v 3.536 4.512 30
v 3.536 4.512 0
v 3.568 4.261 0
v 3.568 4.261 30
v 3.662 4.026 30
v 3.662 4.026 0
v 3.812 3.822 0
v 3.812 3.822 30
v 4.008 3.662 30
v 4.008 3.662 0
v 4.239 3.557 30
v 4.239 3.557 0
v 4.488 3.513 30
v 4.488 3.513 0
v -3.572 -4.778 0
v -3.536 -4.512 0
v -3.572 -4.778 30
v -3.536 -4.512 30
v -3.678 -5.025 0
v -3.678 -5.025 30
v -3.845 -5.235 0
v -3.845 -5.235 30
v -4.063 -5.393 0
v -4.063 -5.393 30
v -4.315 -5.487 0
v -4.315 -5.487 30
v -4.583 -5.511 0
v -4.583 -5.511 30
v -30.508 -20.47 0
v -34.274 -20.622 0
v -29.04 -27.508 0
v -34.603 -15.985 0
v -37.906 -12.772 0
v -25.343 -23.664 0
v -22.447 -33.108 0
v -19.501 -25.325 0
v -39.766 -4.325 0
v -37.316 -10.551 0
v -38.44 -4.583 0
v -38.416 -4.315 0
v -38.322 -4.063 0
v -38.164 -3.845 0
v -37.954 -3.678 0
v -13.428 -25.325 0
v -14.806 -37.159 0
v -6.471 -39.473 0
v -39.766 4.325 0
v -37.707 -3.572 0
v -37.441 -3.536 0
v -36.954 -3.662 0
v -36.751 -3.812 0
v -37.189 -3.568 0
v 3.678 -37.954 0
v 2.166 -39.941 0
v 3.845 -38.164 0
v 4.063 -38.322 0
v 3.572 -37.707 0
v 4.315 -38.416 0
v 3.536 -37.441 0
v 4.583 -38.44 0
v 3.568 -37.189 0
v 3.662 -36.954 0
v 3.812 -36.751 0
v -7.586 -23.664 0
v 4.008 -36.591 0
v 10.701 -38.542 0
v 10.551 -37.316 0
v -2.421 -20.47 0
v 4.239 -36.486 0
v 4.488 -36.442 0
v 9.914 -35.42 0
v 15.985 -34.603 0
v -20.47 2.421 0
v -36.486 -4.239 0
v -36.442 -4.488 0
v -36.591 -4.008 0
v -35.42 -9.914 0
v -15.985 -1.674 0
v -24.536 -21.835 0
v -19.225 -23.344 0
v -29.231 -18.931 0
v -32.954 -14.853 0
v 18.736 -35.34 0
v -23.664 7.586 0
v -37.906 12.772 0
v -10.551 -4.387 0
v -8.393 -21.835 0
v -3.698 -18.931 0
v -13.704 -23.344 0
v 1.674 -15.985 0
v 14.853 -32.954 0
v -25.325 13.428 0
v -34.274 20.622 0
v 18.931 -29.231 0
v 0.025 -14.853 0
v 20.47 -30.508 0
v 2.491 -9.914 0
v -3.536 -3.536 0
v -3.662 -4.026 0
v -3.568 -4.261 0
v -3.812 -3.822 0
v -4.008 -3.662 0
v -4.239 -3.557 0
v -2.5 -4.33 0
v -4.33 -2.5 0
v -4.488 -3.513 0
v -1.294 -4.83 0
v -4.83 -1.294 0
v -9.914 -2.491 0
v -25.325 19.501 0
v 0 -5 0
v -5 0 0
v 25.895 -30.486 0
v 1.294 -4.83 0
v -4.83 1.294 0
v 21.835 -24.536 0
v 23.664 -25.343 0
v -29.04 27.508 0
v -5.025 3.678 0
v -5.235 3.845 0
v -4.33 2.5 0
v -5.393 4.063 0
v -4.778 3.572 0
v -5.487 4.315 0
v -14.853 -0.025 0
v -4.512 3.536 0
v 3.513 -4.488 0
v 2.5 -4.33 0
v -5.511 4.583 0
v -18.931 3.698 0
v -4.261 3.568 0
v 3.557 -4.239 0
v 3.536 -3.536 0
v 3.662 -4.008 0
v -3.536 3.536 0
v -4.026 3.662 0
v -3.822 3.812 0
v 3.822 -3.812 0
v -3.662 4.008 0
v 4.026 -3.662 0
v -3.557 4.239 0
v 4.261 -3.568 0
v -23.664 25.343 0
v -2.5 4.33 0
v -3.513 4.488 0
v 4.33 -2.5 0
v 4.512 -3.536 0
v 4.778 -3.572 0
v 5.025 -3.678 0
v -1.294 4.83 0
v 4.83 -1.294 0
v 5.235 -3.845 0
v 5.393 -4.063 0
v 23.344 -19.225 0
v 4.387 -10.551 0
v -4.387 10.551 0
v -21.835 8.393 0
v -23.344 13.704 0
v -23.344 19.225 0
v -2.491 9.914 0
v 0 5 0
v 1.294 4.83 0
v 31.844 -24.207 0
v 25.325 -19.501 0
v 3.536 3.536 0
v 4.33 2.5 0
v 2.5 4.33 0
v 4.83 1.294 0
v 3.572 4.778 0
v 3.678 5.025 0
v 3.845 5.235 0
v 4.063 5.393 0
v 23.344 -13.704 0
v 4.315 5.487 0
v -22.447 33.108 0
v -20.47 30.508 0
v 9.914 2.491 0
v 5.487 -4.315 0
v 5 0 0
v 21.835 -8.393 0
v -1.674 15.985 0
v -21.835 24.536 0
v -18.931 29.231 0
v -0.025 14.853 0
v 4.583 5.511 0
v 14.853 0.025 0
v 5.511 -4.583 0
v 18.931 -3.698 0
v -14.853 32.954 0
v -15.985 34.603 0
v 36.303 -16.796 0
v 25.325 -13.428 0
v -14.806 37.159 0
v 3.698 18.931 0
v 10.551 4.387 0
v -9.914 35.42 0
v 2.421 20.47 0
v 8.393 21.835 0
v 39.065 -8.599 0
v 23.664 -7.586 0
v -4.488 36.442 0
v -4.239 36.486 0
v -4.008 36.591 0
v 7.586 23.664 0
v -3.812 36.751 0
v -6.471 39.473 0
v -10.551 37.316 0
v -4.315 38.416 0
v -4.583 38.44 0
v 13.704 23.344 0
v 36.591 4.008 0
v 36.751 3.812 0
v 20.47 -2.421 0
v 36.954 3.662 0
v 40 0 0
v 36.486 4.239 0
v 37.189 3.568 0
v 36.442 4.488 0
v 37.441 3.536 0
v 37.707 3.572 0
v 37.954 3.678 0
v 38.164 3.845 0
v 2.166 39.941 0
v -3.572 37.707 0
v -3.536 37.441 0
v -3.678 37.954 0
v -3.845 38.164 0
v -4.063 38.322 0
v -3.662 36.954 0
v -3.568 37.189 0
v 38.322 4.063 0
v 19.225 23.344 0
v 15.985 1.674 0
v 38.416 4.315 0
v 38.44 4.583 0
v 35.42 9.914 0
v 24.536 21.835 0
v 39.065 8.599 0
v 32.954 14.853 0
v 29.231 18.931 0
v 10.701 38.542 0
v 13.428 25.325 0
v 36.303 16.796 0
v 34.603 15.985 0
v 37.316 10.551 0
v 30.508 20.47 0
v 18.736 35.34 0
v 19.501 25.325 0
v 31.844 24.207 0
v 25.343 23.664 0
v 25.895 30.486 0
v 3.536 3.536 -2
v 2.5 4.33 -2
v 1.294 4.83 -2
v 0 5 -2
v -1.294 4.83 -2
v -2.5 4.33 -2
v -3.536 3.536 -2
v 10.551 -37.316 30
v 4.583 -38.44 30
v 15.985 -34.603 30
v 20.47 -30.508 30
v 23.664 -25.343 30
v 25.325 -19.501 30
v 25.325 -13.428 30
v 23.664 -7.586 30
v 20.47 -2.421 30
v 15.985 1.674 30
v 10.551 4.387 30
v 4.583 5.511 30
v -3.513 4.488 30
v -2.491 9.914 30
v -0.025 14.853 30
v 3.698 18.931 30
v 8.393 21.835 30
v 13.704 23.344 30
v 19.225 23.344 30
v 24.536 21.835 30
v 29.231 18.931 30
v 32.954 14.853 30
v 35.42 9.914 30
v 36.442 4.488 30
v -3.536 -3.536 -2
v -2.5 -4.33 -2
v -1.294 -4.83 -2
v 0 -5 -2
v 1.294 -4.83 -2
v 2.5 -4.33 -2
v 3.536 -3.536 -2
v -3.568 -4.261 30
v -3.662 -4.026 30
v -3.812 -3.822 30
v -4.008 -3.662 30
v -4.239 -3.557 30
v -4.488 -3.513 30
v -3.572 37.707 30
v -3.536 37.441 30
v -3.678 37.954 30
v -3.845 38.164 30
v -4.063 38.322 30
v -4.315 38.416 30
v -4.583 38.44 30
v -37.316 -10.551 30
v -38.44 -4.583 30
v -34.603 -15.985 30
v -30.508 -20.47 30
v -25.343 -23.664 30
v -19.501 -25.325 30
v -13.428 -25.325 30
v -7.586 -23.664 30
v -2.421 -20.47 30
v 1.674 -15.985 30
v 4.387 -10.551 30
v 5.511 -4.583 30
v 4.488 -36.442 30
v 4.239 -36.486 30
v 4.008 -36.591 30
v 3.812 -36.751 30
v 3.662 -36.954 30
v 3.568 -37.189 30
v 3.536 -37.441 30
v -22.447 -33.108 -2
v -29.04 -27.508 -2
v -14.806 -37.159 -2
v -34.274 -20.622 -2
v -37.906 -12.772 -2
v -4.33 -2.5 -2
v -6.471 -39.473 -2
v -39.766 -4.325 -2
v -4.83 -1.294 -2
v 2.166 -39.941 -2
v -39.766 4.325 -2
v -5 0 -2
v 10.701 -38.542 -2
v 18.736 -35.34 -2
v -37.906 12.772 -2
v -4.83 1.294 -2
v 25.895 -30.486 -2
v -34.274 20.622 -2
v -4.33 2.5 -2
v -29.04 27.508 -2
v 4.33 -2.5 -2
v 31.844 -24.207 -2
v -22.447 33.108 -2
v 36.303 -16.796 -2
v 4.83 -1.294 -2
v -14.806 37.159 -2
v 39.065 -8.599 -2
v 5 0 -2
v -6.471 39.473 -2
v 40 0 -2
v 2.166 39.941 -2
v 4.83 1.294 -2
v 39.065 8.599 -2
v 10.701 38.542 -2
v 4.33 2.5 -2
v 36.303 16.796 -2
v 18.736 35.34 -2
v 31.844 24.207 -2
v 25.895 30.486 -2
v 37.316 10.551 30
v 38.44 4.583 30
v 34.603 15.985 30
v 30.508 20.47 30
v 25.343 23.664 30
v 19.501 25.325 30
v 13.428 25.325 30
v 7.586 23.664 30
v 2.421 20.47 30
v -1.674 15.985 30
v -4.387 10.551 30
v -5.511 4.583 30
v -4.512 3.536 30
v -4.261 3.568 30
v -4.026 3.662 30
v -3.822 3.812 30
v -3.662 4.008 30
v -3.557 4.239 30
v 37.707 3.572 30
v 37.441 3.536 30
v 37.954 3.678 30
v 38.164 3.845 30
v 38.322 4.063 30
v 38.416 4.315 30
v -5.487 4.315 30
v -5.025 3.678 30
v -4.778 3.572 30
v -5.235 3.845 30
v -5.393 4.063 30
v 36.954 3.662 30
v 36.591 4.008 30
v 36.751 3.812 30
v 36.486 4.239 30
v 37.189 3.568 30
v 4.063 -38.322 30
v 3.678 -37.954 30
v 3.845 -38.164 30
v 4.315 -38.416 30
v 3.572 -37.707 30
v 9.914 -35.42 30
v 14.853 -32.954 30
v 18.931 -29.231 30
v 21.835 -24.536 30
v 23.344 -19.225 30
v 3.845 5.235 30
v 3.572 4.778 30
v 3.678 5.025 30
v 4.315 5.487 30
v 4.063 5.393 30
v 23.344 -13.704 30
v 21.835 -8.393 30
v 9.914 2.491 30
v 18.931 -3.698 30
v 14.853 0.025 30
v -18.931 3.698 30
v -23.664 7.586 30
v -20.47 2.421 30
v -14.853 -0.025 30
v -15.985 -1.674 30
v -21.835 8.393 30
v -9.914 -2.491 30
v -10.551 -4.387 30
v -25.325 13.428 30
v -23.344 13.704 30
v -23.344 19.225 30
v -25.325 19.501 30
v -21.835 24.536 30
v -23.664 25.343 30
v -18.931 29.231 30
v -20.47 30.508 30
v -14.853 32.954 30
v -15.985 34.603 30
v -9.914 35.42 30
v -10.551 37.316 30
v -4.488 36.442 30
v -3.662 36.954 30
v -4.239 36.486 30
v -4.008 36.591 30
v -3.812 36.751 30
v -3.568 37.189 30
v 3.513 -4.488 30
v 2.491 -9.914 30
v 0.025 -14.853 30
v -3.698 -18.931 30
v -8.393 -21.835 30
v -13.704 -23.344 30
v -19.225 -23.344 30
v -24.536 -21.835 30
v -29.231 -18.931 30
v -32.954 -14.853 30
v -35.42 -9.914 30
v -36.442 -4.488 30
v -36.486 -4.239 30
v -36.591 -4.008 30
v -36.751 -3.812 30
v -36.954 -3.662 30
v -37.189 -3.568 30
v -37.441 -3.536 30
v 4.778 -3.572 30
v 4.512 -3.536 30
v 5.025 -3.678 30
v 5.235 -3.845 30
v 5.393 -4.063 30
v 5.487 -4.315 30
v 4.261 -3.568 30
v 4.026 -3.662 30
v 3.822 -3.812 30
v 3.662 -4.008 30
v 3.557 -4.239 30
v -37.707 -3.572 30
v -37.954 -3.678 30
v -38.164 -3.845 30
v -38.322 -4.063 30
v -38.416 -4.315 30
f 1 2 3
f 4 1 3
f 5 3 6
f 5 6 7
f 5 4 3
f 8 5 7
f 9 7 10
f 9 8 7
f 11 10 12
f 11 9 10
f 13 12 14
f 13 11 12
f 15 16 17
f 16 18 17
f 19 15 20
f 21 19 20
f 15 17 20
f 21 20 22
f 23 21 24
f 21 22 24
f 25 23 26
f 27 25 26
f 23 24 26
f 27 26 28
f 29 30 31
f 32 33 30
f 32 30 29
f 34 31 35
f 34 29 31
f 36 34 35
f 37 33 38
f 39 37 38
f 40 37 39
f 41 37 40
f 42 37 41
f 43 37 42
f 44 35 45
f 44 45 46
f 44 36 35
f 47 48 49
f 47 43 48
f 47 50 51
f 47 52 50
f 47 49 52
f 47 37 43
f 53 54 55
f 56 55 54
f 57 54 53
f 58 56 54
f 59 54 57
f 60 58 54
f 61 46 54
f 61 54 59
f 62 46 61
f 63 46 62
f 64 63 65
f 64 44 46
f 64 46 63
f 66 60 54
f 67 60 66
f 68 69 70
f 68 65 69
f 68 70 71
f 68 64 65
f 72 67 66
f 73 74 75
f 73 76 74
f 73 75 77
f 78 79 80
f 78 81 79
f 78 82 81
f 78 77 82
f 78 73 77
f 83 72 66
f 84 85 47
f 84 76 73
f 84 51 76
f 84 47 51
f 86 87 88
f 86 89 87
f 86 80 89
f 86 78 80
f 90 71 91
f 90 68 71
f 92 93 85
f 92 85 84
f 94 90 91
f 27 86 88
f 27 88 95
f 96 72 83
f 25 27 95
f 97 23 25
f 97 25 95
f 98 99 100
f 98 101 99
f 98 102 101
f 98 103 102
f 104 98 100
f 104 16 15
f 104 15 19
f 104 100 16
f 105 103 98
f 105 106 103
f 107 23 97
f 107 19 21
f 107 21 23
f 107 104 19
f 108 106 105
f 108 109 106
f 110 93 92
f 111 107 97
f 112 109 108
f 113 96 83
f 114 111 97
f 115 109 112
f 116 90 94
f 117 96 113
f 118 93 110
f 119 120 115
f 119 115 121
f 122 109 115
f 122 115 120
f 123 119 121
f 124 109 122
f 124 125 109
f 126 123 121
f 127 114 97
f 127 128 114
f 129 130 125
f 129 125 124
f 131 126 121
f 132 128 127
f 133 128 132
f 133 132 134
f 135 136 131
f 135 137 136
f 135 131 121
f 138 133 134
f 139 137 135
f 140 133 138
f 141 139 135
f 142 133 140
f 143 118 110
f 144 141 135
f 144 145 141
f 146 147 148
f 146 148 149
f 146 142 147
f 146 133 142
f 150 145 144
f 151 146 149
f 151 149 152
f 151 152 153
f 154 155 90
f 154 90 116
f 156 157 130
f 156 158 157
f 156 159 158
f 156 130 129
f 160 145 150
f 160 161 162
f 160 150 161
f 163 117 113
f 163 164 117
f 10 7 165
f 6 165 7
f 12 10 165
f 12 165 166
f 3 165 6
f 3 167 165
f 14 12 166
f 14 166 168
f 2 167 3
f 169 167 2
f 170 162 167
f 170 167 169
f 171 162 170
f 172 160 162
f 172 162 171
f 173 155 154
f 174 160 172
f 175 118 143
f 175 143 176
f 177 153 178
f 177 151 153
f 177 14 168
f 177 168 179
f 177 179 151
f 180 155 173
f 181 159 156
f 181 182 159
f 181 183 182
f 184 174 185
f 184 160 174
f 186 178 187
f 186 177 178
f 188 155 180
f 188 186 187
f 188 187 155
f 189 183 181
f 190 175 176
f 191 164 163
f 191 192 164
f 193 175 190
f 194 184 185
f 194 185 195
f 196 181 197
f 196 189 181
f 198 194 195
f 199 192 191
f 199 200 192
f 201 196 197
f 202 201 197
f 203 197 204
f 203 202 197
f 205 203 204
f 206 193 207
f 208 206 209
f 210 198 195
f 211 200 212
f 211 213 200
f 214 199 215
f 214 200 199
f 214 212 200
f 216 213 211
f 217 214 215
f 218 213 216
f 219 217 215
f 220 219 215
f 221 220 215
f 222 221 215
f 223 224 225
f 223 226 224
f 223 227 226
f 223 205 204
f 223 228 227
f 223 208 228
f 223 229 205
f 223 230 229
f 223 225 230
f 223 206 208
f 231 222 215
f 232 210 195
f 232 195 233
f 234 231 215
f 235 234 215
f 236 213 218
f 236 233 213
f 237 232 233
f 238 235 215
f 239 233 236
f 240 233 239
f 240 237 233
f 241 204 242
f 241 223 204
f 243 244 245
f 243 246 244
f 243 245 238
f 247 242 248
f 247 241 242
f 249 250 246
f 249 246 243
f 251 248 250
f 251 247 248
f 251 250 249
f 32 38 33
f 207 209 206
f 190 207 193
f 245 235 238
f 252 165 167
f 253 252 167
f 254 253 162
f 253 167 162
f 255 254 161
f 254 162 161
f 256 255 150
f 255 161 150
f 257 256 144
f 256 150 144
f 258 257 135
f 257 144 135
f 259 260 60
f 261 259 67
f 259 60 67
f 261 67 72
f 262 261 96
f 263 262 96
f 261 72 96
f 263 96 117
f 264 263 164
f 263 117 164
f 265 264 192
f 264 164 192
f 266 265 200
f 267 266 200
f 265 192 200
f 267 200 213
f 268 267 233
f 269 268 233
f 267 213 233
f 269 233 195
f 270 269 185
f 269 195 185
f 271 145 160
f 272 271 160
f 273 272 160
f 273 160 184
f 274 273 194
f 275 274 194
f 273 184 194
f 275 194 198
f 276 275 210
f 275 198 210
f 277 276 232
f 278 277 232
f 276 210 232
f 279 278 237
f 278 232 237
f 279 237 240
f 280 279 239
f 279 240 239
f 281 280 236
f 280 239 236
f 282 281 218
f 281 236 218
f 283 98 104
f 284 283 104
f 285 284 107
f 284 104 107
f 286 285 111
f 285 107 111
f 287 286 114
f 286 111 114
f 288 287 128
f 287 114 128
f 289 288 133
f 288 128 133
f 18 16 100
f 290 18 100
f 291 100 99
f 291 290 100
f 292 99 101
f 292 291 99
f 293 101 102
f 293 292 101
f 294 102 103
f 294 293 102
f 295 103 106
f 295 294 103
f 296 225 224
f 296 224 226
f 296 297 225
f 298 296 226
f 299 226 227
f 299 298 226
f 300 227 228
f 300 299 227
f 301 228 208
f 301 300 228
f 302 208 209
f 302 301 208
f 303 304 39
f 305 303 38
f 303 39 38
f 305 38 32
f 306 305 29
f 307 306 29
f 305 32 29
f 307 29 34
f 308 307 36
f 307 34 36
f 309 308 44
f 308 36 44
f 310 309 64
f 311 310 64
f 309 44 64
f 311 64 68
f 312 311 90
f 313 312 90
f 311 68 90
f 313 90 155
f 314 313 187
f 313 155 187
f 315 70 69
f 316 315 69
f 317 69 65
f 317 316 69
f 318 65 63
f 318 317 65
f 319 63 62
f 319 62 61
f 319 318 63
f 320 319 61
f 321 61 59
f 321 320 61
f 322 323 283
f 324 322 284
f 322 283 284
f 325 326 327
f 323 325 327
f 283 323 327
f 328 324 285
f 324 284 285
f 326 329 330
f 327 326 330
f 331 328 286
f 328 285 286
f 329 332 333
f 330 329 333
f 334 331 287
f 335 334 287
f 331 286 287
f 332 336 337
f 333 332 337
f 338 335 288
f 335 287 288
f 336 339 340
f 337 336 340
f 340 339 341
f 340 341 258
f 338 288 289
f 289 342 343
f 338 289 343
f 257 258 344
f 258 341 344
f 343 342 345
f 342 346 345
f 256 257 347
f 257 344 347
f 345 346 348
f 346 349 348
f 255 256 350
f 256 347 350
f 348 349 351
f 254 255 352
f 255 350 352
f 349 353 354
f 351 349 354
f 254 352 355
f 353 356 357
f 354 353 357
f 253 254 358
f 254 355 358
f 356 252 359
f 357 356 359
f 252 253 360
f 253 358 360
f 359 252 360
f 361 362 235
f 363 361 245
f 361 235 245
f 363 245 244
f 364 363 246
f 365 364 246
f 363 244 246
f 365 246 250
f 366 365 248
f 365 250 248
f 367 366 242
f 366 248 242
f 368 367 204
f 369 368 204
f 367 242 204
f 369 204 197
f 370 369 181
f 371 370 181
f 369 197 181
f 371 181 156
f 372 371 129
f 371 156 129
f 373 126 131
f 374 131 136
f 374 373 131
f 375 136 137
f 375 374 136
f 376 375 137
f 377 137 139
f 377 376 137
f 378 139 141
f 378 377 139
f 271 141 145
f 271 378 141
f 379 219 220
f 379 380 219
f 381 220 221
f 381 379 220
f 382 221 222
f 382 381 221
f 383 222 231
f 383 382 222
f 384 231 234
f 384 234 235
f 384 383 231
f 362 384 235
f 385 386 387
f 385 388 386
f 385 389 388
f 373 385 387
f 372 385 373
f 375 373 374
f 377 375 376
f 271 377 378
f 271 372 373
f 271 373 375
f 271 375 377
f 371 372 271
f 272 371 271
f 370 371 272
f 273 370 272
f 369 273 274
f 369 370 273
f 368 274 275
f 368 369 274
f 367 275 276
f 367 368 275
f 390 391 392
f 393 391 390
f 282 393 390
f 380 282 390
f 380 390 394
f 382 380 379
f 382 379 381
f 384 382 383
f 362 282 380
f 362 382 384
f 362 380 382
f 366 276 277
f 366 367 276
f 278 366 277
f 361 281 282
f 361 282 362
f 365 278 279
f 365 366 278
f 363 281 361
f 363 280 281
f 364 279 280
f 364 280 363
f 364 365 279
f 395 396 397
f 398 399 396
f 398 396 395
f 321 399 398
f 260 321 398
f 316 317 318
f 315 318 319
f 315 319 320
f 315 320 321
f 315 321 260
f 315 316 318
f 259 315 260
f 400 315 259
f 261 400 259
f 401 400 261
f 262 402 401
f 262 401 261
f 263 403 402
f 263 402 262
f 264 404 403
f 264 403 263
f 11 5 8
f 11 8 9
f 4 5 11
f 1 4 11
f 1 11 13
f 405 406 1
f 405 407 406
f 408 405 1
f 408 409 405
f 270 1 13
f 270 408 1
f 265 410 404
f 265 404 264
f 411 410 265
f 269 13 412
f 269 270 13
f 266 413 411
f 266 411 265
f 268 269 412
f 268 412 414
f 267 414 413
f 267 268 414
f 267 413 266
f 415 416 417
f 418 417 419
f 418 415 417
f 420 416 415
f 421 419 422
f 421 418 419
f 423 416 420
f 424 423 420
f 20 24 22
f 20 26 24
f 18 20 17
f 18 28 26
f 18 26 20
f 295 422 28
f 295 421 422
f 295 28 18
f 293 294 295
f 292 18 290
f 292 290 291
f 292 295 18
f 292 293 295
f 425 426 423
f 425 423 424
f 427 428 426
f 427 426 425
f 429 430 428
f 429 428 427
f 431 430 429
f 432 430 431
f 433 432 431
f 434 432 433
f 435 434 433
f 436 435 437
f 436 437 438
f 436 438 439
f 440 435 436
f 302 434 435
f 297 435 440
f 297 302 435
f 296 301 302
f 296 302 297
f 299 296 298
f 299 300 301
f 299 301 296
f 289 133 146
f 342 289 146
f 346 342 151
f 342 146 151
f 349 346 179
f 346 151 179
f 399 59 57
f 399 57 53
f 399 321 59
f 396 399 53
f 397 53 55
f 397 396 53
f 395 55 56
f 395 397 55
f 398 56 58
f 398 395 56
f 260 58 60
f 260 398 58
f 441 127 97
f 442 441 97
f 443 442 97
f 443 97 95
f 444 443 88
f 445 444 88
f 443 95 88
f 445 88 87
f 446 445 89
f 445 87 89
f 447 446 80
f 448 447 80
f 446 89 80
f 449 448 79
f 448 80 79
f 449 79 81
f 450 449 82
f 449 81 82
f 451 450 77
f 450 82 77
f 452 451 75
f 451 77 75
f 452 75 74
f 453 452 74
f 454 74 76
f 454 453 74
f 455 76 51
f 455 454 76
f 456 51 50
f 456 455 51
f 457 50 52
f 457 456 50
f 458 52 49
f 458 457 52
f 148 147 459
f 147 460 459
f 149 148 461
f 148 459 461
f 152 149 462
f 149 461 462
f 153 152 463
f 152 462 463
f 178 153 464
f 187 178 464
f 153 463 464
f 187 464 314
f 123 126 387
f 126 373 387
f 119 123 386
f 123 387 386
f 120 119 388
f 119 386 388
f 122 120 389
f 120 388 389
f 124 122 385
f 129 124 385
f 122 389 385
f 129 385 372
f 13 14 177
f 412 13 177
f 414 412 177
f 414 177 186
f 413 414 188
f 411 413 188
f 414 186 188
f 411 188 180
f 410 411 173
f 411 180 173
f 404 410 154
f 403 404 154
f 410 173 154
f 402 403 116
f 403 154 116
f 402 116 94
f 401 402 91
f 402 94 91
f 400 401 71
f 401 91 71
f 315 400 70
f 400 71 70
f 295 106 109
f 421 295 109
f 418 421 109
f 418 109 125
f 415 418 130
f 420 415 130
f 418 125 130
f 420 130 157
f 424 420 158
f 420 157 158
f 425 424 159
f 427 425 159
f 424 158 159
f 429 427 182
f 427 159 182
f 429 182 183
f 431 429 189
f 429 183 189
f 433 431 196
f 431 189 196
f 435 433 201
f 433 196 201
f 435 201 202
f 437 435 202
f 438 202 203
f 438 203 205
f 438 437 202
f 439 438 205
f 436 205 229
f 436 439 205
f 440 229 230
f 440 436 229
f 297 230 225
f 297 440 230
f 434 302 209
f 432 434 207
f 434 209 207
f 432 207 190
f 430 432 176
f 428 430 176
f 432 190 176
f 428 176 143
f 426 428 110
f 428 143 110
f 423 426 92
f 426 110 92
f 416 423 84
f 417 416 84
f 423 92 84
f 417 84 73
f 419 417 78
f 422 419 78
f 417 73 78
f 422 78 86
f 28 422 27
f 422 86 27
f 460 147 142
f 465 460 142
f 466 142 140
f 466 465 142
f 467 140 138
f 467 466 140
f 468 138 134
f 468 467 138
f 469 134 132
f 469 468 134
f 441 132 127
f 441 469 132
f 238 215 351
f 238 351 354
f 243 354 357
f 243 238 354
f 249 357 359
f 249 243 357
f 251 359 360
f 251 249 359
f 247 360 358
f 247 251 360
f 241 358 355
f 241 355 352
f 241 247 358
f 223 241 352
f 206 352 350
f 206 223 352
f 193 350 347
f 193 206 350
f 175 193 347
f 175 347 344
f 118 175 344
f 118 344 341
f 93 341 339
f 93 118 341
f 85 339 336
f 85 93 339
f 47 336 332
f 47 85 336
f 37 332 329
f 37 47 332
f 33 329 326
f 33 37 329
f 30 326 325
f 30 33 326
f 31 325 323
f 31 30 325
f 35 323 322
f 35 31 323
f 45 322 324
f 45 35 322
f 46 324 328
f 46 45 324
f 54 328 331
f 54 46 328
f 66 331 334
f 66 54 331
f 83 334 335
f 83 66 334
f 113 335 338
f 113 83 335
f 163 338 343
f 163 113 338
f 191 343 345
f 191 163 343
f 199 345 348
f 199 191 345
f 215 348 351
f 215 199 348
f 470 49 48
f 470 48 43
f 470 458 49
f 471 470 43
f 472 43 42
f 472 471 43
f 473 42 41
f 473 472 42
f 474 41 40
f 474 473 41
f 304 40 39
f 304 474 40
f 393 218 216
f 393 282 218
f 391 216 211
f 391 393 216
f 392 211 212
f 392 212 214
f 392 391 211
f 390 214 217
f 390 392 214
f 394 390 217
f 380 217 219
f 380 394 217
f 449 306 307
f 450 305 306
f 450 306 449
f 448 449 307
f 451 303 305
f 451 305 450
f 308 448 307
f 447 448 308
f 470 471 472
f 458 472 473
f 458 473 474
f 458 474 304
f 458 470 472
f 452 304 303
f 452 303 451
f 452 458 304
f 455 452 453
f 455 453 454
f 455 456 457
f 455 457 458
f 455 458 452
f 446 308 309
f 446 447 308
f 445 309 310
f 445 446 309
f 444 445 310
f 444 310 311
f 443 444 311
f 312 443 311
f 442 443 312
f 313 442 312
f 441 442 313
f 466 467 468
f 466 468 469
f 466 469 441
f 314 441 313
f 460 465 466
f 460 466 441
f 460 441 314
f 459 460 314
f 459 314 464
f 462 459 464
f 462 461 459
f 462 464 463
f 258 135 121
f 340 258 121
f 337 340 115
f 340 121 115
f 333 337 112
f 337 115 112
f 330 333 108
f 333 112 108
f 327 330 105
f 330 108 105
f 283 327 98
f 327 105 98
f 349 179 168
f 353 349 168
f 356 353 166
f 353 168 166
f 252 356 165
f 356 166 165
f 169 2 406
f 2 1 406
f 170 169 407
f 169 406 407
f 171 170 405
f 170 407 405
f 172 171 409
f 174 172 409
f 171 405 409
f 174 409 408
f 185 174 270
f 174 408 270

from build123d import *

# Parameters (mm, degrees)
F1_DEPTH = 30
F2_R     = 0.99999
F2_2_R   = 0.99999
F2_3_R   = 0.99999
F2_4_R   = 0.99999
F3_R     = 40
F4_DEPTH = 2
F5_DEPTH = 25


# Not quite as in the source:
# - a fillet or chamfer is up to 0.001 mm smaller than in the source, because OpenCascade refuses the exact size


with BuildPart() as f1:
    # F0 (on Top) → F1 (new body)
    with BuildSketch(Plane.XY):
        with BuildLine():
            Line((-5.5355339059, 3.5355339059), (-3.5355339059, 3.5355339059))
            ThreePointArc((-3.5355339059, 3.5355339059), (16.4644660941, 23.5355339059), (36.4644660941, 3.5355339059))
            Line((36.4644660941, 3.5355339059), (38.4644660941, 3.5355339059))
            ThreePointArc((38.4644660941, 3.5355339059), (16.4644660941, 25.5355339059), (-5.5355339059, 3.5355339059))
        make_face()
    extrude(amount=F1_DEPTH)

    # F2 (radius 1 in the source; OpenCascade refuses exactly that, so slightly less here)
    f2_edges = [f1.edges().sort_by_distance(p)[0] for p in [
        (-3.535534, 3.535534, 15),
        (-5.535534, 3.535534, 15),
        (38.464466, 3.535534, 15),
        (36.464466, 3.535534, 15),
    ]]
    fillet(f2_edges, radius=F2_R)



with BuildPart() as f1b:
    # F0 (on Top) → F1, piece 2 (new body)
    with BuildSketch(Plane.XY):
        with BuildLine():
            Line((3.5355339059, 5.5355339059), (3.5355339059, 3.5355339059))
            ThreePointArc((3.5355339059, 3.5355339059), (23.5355339059, -16.4644660941), (3.5355339059, -36.4644660941))
            Line((3.5355339059, -36.4644660941), (3.5355339059, -38.4644660941))
            ThreePointArc((3.5355339059, -38.4644660941), (25.5355339059, -16.4644660941), (3.5355339059, 5.5355339059))
        make_face()
    extrude(amount=F1_DEPTH)

    # F2#2 (radius 1 in the source; OpenCascade refuses exactly that, so slightly less here)
    f2_2_edges = [f1b.edges().sort_by_distance(p)[0] for p in [
        (3.535534, 3.535534, 15),
        (3.535534, 5.535534, 15),
        (3.535534, -38.464466, 15),
        (3.535534, -36.464466, 15),
    ]]
    fillet(f2_2_edges, radius=F2_2_R)


with BuildPart() as f1c:
    # F0 (on Top) → F1, piece 3 (new body)
    with BuildSketch(Plane.XY):
        with BuildLine():
            Line((-3.5355339059, -5.5355339059), (-3.5355339059, -3.5355339059))
            ThreePointArc((-3.5355339059, -3.5355339059), (-23.5355339059, 16.4644660941), (-3.5355339059, 36.4644660941))
            Line((-3.5355339059, 36.4644660941), (-3.5355339059, 38.4644660941))
            ThreePointArc((-3.5355339059, 38.4644660941), (-25.5355339059, 16.4644660941), (-3.5355339059, -5.5355339059))
        make_face()
    extrude(amount=F1_DEPTH)

    # F2#4 (radius 1 in the source; OpenCascade refuses exactly that, so slightly less here)
    f2_4_edges = [f1c.edges().sort_by_distance(p)[0] for p in [
        (-3.535534, -3.535534, 15),
        (-3.535534, -5.535534, 15),
        (-3.535534, 38.464466, 15),
        (-3.535534, 36.464466, 15),
    ]]
    fillet(f2_4_edges, radius=F2_4_R)


with BuildPart() as f1d:
    # F0 (on Top) → F1, piece 4 (new body)
    with BuildSketch(Plane.XY):
        with BuildLine():
            Line((5.5355339059, -3.5355339059), (3.5355339059, -3.5355339059))
            ThreePointArc((3.5355339059, -3.5355339059), (-16.4644660941, -23.5355339059), (-36.4644660941, -3.5355339059))
            Line((-36.4644660941, -3.5355339059), (-38.4644660941, -3.5355339059))
            ThreePointArc((-38.4644660941, -3.5355339059), (-16.4644660941, -25.5355339059), (5.5355339059, -3.5355339059))
        make_face()
    extrude(amount=F1_DEPTH)

    # F2#3 (radius 1 in the source; OpenCascade refuses exactly that, so slightly less here)
    f2_3_edges = [f1d.edges().sort_by_distance(p)[0] for p in [
        (3.535534, -3.535534, 15),
        (5.535534, -3.535534, 15),
        (-38.464466, -3.535534, 15),
        (-36.464466, -3.535534, 15),
    ]]
    fillet(f2_3_edges, radius=F2_3_R)


with BuildPart() as f1_1:
    add(f1.part)

    add(f1b.part)  # F4 merges F1b

    add(f1c.part)  # F4 merges F1c

    add(f1d.part)  # F4 merges F1d
    # F3 (on Top) → F4 (join)
    with BuildSketch(Plane.XY):
        Circle(F3_R)
    extrude(amount=-F4_DEPTH)

    # F0 (on Top) → F5 (cut)
    with BuildSketch(Plane.XY):
        Polygon((-3.5355339059, -3.5355339059), (3.5355339059, -3.5355339059), (0, 0), align=None)
        with BuildLine():
            ThreePointArc((-3.5355339059, -3.5355339059), (0, -5), (3.5355339059, -3.5355339059))
            Line((3.5355339059, -3.5355339059), (-3.5355339059, -3.5355339059))
        make_face()
        Polygon((0, 0), (-3.5355339059, 3.5355339059), (-3.5355339059, -3.5355339059), align=None)
        with BuildLine():
            Line((-3.5355339059, -3.5355339059), (-3.5355339059, 3.5355339059))
            ThreePointArc((-3.5355339059, 3.5355339059), (-5, 0), (-3.5355339059, -3.5355339059))
        make_face()
        Polygon((0, 0), (3.5355339059, 3.5355339059), (-3.5355339059, 3.5355339059), align=None)
        with BuildLine():
            Line((-3.5355339059, 3.5355339059), (3.5355339059, 3.5355339059))
            ThreePointArc((3.5355339059, 3.5355339059), (0, 5), (-3.5355339059, 3.5355339059))
        make_face()
        Polygon((3.5355339059, -3.5355339059), (3.5355339059, 3.5355339059), (0, 0), align=None)
        with BuildLine():
            ThreePointArc((3.5355339059, -3.5355339059), (4.6193976626, -1.9134171618), (5, 0))
            ThreePointArc((5, 0), (4.6193976626, 1.9134171618), (3.5355339059, 3.5355339059))
            Line((3.5355339059, 3.5355339059), (3.5355339059, -3.5355339059))
        make_face()
    extrude(amount=-F5_DEPTH, mode=Mode.SUBTRACT)


solid = f1_1.part
